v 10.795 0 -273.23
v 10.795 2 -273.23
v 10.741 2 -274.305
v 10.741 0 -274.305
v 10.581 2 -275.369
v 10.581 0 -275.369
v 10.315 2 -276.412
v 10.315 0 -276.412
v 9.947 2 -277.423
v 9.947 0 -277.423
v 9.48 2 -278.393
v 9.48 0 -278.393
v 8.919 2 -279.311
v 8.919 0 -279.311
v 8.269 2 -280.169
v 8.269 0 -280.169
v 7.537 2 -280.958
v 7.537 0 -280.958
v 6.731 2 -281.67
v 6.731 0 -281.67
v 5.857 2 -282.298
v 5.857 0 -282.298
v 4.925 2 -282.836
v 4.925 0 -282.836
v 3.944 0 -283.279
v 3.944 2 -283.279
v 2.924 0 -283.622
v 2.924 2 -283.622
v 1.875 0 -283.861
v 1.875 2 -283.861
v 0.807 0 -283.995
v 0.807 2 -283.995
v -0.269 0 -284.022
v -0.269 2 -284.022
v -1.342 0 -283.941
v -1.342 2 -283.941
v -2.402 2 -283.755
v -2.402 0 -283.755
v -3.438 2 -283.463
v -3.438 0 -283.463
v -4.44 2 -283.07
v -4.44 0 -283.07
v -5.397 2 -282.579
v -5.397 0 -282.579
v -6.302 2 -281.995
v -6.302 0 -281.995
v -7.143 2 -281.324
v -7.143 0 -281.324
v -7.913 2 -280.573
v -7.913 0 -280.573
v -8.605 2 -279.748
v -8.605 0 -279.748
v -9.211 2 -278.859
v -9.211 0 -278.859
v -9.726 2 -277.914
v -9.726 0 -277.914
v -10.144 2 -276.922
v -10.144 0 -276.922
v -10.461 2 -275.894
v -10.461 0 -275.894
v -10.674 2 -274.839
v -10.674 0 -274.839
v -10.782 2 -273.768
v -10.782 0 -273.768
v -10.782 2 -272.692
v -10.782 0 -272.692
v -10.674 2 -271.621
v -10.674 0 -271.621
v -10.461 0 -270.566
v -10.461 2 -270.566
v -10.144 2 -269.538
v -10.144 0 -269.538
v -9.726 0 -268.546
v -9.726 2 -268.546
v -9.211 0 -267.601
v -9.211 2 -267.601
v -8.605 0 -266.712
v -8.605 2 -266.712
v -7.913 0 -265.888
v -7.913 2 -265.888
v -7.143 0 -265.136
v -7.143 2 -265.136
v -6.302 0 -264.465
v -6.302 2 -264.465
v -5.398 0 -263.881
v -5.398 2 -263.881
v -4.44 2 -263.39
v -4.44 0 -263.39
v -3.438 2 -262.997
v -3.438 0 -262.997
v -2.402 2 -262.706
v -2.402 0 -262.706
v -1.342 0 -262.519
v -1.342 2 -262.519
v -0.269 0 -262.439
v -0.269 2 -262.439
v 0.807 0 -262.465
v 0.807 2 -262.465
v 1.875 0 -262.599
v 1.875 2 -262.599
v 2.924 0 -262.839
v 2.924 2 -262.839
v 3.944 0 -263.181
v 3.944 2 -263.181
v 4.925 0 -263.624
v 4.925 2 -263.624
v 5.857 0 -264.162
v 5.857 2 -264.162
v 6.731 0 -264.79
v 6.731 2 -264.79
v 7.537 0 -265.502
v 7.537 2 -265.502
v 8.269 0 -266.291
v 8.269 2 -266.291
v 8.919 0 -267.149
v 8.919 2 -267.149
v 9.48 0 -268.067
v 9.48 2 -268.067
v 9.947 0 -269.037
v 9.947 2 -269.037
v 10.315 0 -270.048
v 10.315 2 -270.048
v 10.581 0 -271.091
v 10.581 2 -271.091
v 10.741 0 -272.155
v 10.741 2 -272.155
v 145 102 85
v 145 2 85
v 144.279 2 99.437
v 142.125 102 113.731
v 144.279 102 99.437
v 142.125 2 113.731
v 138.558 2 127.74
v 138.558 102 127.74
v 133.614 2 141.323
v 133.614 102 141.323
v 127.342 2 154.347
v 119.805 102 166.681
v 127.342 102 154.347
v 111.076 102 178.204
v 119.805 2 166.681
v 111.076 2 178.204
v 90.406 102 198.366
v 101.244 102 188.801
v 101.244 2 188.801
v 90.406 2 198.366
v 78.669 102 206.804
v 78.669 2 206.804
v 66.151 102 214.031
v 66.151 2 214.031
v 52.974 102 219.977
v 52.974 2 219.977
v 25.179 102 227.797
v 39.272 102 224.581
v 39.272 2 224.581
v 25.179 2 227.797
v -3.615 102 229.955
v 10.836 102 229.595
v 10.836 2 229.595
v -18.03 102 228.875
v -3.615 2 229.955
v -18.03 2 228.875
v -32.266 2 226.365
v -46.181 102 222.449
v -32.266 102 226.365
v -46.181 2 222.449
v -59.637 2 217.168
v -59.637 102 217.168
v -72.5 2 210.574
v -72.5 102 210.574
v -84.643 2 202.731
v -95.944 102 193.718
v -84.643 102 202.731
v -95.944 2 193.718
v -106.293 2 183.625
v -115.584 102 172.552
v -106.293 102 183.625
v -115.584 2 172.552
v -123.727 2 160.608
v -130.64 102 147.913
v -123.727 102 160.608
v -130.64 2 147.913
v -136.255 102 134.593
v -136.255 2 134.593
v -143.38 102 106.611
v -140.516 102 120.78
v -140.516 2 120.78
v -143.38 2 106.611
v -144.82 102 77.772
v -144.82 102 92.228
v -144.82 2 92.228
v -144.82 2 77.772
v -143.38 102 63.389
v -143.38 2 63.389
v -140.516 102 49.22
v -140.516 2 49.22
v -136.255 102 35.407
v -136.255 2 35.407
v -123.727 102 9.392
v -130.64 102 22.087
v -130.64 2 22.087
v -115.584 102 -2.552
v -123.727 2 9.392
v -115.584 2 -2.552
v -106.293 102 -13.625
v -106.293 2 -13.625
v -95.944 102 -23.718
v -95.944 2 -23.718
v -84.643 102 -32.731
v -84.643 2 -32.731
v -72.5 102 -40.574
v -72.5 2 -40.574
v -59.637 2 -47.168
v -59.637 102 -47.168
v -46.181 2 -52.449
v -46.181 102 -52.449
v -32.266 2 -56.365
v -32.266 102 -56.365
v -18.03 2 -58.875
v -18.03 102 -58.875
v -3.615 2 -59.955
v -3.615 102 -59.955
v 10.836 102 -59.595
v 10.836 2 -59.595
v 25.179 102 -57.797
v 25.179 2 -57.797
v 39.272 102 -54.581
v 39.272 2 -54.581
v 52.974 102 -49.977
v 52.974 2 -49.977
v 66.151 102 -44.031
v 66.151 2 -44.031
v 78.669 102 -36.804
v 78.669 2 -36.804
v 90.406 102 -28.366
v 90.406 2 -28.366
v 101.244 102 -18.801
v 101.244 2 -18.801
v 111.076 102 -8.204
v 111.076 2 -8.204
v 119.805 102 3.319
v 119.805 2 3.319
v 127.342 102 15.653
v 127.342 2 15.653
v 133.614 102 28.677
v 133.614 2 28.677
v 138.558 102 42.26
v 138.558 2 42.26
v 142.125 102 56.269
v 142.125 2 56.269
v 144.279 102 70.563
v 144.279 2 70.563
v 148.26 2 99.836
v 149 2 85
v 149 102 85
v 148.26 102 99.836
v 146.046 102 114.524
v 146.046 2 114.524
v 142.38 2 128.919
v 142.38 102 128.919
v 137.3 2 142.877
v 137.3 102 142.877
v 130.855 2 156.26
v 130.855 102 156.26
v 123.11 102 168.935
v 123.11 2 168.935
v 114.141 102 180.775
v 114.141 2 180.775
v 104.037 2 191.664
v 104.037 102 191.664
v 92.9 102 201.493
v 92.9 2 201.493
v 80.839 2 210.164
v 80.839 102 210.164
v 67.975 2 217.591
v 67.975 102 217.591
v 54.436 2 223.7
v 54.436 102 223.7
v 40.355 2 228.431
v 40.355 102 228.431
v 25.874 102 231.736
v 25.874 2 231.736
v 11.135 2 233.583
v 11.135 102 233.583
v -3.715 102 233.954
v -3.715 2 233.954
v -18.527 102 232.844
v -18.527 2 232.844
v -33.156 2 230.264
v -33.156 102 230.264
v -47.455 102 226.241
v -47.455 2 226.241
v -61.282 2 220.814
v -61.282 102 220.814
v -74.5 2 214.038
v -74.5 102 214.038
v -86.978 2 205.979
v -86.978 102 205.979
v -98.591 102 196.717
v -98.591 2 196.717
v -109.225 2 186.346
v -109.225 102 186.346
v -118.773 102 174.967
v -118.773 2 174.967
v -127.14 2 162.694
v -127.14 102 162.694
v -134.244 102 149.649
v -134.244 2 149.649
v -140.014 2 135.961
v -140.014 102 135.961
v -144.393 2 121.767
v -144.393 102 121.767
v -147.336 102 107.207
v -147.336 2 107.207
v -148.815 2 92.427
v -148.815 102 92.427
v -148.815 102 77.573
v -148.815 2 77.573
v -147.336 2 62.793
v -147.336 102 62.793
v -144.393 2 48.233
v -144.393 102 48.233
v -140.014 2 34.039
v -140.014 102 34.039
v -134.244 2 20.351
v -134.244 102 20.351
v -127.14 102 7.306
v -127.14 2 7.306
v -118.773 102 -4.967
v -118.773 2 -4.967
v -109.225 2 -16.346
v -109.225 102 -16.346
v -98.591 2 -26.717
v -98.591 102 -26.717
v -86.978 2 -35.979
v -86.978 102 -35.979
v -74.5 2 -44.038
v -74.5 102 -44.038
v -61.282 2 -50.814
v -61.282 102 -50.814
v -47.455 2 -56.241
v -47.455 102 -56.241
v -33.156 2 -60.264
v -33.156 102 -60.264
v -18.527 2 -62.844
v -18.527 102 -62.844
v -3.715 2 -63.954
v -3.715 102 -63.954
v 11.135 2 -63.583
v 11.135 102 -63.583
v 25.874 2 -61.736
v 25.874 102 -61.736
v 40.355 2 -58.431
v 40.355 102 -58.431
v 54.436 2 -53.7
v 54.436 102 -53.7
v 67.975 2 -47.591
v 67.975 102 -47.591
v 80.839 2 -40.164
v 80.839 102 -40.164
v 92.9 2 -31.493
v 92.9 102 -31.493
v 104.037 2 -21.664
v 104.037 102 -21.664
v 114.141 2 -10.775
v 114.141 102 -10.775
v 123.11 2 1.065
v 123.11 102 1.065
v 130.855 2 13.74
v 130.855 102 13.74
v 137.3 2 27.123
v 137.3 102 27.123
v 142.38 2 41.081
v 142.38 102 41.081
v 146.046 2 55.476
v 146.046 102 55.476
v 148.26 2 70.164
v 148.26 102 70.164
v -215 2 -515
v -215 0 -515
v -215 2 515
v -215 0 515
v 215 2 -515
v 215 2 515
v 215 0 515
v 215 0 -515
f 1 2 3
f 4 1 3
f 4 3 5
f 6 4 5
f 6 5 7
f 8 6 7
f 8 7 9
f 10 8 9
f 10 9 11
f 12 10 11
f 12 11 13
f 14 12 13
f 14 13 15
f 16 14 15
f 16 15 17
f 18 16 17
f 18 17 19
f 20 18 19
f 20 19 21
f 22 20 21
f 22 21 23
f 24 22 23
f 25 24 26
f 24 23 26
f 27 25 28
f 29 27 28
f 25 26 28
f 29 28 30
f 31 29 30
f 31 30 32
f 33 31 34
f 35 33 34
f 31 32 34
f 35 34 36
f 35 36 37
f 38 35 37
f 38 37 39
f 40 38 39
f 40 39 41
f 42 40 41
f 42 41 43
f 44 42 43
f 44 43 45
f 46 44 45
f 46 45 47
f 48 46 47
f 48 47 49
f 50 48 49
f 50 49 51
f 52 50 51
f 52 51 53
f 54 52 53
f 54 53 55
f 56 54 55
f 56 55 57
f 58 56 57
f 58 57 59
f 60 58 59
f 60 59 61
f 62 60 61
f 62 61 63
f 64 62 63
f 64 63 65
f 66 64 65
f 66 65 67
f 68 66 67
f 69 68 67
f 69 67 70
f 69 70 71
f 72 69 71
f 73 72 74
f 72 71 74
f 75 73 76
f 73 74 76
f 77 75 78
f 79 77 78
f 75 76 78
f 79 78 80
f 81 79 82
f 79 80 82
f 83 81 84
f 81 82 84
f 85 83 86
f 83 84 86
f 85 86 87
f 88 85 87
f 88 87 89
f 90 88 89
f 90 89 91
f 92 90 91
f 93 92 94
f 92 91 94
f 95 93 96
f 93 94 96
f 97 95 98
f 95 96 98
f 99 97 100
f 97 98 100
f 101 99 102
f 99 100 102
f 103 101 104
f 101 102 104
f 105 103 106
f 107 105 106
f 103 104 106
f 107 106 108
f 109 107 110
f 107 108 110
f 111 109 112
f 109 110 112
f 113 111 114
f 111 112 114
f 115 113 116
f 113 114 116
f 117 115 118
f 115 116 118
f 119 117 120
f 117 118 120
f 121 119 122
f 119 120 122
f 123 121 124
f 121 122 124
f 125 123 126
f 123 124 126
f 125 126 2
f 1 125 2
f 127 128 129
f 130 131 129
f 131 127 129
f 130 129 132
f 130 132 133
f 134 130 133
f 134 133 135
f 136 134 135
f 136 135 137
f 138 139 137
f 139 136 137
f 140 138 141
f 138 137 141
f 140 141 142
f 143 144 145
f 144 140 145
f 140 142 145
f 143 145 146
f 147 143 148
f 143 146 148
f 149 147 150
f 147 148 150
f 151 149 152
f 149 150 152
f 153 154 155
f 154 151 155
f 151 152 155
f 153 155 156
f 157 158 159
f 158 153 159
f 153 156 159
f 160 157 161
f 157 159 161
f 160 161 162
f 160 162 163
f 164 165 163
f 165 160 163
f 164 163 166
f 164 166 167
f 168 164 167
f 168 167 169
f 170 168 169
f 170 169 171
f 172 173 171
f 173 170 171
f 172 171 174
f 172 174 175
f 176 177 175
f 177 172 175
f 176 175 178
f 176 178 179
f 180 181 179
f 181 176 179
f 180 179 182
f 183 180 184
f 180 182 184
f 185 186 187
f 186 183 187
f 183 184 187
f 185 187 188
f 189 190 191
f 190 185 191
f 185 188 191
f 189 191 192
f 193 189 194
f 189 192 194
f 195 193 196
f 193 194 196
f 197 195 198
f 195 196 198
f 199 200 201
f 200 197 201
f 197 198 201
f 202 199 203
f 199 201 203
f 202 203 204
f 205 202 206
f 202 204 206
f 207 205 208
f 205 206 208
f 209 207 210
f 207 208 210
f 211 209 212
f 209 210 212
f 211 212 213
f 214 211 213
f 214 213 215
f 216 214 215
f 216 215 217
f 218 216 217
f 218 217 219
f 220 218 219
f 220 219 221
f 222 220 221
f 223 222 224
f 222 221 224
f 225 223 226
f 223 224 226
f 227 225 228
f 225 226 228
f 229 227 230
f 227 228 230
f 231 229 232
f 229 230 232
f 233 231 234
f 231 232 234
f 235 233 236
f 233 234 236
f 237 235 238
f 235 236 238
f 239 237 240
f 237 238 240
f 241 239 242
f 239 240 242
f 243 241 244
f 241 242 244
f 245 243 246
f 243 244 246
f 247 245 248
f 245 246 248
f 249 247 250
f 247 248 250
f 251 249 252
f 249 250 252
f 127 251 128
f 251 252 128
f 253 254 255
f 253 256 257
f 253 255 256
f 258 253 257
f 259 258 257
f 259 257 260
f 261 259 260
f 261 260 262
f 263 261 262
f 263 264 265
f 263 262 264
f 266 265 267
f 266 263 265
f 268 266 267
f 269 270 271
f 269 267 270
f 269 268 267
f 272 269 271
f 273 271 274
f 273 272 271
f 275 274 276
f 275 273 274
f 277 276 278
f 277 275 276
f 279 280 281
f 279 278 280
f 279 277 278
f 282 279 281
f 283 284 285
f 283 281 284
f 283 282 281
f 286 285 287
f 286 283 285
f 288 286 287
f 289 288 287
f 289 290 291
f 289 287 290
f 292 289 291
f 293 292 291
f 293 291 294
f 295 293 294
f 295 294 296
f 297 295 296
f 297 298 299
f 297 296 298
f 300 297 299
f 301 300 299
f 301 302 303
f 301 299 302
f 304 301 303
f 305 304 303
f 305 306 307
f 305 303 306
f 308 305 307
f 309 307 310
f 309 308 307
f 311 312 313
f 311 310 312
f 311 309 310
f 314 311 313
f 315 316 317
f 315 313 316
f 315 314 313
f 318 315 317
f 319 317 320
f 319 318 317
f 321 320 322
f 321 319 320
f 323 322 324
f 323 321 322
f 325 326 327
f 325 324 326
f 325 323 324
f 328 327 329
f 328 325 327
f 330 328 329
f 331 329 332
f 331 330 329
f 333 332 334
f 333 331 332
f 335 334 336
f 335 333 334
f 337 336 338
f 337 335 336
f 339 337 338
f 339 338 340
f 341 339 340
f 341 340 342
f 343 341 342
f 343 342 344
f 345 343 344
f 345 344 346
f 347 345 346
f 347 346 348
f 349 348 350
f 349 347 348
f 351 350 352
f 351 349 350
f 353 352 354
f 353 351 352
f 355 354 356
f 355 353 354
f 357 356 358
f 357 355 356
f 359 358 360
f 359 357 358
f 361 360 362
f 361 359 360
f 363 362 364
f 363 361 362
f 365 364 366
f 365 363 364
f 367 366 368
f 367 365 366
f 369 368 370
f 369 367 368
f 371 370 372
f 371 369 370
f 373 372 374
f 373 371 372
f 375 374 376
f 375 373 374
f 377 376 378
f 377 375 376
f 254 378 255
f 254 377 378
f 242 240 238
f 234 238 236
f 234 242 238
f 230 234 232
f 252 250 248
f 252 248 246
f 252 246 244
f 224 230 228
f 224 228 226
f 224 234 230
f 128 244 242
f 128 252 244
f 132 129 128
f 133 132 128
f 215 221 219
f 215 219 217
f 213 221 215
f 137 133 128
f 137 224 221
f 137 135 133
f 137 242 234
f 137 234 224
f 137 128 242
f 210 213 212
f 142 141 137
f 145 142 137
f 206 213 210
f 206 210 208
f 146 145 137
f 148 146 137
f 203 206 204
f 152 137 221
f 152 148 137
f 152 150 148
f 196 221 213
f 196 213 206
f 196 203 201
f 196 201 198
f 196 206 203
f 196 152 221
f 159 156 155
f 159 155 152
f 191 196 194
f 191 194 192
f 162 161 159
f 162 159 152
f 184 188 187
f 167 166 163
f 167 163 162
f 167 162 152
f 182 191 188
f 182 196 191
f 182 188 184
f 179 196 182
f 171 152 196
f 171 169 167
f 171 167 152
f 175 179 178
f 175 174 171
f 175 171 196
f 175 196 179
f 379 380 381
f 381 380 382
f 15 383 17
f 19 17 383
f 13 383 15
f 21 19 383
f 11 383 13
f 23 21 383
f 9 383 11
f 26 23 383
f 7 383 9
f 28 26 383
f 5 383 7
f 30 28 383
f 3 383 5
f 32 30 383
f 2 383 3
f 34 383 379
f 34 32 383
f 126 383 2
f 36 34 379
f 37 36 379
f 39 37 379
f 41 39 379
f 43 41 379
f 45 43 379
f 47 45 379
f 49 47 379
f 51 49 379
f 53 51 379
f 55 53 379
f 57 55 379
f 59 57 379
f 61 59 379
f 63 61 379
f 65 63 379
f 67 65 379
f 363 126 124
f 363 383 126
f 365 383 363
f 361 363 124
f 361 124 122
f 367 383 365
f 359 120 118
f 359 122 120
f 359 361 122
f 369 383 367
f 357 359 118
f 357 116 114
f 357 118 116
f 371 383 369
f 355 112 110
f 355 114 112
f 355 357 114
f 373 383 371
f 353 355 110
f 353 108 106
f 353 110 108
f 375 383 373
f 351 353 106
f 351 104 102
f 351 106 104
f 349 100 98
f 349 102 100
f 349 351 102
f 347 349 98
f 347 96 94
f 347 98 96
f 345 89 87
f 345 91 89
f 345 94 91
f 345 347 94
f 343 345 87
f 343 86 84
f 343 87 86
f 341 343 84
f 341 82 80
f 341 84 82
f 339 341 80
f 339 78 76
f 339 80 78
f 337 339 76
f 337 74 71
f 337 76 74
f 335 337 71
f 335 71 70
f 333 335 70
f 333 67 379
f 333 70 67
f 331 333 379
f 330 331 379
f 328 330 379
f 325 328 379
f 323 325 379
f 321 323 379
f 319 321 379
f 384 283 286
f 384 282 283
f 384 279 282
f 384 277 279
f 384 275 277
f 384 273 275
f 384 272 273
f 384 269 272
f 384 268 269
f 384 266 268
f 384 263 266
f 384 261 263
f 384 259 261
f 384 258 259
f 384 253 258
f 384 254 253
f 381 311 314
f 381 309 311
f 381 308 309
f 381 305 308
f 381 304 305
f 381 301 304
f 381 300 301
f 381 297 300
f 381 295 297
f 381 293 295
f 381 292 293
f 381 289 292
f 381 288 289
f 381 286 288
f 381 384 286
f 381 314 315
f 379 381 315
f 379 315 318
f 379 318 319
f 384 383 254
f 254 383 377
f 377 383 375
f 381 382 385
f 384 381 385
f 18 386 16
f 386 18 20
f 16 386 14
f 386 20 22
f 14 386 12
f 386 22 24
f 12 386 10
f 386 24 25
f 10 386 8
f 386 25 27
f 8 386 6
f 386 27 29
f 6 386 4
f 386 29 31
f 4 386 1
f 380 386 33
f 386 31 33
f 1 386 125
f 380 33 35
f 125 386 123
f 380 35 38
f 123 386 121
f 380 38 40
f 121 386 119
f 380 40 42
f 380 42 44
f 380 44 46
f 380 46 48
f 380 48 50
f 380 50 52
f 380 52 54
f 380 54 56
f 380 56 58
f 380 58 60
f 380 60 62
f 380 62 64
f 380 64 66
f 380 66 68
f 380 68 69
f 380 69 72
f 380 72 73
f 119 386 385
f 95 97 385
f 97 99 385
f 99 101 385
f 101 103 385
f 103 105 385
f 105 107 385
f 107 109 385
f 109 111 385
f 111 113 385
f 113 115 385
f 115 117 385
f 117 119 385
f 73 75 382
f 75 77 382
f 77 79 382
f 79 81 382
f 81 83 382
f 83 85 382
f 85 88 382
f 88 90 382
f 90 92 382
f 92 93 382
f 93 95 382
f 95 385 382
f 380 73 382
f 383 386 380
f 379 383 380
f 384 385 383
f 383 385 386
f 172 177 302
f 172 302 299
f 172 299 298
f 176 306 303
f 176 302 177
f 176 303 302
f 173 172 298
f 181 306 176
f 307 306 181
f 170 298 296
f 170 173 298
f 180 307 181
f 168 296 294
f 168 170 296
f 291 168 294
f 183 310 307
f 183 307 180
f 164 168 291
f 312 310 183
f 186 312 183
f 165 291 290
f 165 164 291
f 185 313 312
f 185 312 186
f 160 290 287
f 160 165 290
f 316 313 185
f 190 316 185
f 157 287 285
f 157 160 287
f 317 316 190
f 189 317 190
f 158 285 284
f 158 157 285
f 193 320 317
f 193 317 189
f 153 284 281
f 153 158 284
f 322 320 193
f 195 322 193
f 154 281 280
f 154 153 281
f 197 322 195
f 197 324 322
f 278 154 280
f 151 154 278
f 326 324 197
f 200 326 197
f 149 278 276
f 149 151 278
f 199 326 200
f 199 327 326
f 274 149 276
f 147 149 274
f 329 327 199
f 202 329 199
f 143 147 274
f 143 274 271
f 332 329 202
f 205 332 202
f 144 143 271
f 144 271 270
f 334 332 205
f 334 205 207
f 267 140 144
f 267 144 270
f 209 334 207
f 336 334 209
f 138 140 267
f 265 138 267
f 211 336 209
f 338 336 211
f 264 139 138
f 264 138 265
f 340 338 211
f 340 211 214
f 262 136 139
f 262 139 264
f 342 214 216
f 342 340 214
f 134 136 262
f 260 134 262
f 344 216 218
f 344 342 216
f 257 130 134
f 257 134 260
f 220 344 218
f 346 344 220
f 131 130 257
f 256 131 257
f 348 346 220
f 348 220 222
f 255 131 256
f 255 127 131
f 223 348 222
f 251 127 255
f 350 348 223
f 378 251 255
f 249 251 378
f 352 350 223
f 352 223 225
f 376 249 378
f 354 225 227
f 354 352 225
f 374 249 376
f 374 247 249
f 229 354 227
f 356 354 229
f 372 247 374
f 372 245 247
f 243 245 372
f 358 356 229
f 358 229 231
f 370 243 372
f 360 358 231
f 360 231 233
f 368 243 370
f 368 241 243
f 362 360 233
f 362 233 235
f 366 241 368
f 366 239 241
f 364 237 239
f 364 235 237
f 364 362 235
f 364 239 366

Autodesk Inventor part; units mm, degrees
ref_plane "YZ Plane" through (0, 0, 0) normal (1, 0, 0) x (0, 1, 0)
ref_plane "XZ Plane" through (0, 0, 0) normal (0, 1, 0) x (-1, 0, 0)
ref_plane "XY Plane" through (0, 0, 0) normal (0, 0, 1) x (1, 0, 0)
sketch "Sketch1" plane through (0, 0, 0) normal (0, 1, 0) x (-1, 0, 0)
  line L0 (215, 515) -> (-215, 515)
  line L1 (-215, 515) -> (-215, -515)
  line L2 (-215, -515) -> (215, -515)
  line L3 (215, -515) -> (215, 515)
  line L4 (215, 515) -> (-215, -515) construction
  line L5 (-215, 515) -> (215, -515) construction
  point P0 (0, 0)
  dimension "d0" = 430
  dimension "d1" = 1030
extrude "Plate1" add sketch "Sketch1" along normal blind 2
sketch "Sketch2" plane through (0, 2, 0) normal (0, 1, 0) x (1, 0, 0)
  circle A0 centre (0, -85) radius 145
  line L0 (215, -515) -> (-215, -515) projected
  circle A1 centre (0, -85) radius 149
  point P0 (0, 0)
  dimension "d3" = 430
  dimension "d4" = 290
  dimension "d5" = 0
  dimension "d6" = 4
extrude "Extrusion1" add sketch "Sketch2" along normal blind 100
sketch "Sketch3" plane through (0, 2, 0) normal (0, 1, 0) x (1, 0, 0)
  circle A0 centre (0, 273.2302) radius 10.795
  point P0 (0, 0)
  dimension "d10" = 21.59
extrude "Cut1" cut sketch "Sketch3" against normal through all
equation "\"d11\" = Thickness"
equation "\"d2\" = Thickness"
equation "\"BendRadius\" = Thickness"
equation "\"BendReliefWidth\" = Thickness"
equation "\"BendReliefDepth\" = 0.5 * Thickness"
equation "\"CornerReliefSize\" = 4 * Thickness"
equation "\"MinimumRemnant\" = 2 * Thickness"
equation "\"TransitionRadius\" = BendRadius"
equation "\"JacobiRadiusSize\" = BendRadius"
equation "\"GapSize\" = Thickness"
equation "\"Thickness\" = 2"
properties part number "mid Base"
